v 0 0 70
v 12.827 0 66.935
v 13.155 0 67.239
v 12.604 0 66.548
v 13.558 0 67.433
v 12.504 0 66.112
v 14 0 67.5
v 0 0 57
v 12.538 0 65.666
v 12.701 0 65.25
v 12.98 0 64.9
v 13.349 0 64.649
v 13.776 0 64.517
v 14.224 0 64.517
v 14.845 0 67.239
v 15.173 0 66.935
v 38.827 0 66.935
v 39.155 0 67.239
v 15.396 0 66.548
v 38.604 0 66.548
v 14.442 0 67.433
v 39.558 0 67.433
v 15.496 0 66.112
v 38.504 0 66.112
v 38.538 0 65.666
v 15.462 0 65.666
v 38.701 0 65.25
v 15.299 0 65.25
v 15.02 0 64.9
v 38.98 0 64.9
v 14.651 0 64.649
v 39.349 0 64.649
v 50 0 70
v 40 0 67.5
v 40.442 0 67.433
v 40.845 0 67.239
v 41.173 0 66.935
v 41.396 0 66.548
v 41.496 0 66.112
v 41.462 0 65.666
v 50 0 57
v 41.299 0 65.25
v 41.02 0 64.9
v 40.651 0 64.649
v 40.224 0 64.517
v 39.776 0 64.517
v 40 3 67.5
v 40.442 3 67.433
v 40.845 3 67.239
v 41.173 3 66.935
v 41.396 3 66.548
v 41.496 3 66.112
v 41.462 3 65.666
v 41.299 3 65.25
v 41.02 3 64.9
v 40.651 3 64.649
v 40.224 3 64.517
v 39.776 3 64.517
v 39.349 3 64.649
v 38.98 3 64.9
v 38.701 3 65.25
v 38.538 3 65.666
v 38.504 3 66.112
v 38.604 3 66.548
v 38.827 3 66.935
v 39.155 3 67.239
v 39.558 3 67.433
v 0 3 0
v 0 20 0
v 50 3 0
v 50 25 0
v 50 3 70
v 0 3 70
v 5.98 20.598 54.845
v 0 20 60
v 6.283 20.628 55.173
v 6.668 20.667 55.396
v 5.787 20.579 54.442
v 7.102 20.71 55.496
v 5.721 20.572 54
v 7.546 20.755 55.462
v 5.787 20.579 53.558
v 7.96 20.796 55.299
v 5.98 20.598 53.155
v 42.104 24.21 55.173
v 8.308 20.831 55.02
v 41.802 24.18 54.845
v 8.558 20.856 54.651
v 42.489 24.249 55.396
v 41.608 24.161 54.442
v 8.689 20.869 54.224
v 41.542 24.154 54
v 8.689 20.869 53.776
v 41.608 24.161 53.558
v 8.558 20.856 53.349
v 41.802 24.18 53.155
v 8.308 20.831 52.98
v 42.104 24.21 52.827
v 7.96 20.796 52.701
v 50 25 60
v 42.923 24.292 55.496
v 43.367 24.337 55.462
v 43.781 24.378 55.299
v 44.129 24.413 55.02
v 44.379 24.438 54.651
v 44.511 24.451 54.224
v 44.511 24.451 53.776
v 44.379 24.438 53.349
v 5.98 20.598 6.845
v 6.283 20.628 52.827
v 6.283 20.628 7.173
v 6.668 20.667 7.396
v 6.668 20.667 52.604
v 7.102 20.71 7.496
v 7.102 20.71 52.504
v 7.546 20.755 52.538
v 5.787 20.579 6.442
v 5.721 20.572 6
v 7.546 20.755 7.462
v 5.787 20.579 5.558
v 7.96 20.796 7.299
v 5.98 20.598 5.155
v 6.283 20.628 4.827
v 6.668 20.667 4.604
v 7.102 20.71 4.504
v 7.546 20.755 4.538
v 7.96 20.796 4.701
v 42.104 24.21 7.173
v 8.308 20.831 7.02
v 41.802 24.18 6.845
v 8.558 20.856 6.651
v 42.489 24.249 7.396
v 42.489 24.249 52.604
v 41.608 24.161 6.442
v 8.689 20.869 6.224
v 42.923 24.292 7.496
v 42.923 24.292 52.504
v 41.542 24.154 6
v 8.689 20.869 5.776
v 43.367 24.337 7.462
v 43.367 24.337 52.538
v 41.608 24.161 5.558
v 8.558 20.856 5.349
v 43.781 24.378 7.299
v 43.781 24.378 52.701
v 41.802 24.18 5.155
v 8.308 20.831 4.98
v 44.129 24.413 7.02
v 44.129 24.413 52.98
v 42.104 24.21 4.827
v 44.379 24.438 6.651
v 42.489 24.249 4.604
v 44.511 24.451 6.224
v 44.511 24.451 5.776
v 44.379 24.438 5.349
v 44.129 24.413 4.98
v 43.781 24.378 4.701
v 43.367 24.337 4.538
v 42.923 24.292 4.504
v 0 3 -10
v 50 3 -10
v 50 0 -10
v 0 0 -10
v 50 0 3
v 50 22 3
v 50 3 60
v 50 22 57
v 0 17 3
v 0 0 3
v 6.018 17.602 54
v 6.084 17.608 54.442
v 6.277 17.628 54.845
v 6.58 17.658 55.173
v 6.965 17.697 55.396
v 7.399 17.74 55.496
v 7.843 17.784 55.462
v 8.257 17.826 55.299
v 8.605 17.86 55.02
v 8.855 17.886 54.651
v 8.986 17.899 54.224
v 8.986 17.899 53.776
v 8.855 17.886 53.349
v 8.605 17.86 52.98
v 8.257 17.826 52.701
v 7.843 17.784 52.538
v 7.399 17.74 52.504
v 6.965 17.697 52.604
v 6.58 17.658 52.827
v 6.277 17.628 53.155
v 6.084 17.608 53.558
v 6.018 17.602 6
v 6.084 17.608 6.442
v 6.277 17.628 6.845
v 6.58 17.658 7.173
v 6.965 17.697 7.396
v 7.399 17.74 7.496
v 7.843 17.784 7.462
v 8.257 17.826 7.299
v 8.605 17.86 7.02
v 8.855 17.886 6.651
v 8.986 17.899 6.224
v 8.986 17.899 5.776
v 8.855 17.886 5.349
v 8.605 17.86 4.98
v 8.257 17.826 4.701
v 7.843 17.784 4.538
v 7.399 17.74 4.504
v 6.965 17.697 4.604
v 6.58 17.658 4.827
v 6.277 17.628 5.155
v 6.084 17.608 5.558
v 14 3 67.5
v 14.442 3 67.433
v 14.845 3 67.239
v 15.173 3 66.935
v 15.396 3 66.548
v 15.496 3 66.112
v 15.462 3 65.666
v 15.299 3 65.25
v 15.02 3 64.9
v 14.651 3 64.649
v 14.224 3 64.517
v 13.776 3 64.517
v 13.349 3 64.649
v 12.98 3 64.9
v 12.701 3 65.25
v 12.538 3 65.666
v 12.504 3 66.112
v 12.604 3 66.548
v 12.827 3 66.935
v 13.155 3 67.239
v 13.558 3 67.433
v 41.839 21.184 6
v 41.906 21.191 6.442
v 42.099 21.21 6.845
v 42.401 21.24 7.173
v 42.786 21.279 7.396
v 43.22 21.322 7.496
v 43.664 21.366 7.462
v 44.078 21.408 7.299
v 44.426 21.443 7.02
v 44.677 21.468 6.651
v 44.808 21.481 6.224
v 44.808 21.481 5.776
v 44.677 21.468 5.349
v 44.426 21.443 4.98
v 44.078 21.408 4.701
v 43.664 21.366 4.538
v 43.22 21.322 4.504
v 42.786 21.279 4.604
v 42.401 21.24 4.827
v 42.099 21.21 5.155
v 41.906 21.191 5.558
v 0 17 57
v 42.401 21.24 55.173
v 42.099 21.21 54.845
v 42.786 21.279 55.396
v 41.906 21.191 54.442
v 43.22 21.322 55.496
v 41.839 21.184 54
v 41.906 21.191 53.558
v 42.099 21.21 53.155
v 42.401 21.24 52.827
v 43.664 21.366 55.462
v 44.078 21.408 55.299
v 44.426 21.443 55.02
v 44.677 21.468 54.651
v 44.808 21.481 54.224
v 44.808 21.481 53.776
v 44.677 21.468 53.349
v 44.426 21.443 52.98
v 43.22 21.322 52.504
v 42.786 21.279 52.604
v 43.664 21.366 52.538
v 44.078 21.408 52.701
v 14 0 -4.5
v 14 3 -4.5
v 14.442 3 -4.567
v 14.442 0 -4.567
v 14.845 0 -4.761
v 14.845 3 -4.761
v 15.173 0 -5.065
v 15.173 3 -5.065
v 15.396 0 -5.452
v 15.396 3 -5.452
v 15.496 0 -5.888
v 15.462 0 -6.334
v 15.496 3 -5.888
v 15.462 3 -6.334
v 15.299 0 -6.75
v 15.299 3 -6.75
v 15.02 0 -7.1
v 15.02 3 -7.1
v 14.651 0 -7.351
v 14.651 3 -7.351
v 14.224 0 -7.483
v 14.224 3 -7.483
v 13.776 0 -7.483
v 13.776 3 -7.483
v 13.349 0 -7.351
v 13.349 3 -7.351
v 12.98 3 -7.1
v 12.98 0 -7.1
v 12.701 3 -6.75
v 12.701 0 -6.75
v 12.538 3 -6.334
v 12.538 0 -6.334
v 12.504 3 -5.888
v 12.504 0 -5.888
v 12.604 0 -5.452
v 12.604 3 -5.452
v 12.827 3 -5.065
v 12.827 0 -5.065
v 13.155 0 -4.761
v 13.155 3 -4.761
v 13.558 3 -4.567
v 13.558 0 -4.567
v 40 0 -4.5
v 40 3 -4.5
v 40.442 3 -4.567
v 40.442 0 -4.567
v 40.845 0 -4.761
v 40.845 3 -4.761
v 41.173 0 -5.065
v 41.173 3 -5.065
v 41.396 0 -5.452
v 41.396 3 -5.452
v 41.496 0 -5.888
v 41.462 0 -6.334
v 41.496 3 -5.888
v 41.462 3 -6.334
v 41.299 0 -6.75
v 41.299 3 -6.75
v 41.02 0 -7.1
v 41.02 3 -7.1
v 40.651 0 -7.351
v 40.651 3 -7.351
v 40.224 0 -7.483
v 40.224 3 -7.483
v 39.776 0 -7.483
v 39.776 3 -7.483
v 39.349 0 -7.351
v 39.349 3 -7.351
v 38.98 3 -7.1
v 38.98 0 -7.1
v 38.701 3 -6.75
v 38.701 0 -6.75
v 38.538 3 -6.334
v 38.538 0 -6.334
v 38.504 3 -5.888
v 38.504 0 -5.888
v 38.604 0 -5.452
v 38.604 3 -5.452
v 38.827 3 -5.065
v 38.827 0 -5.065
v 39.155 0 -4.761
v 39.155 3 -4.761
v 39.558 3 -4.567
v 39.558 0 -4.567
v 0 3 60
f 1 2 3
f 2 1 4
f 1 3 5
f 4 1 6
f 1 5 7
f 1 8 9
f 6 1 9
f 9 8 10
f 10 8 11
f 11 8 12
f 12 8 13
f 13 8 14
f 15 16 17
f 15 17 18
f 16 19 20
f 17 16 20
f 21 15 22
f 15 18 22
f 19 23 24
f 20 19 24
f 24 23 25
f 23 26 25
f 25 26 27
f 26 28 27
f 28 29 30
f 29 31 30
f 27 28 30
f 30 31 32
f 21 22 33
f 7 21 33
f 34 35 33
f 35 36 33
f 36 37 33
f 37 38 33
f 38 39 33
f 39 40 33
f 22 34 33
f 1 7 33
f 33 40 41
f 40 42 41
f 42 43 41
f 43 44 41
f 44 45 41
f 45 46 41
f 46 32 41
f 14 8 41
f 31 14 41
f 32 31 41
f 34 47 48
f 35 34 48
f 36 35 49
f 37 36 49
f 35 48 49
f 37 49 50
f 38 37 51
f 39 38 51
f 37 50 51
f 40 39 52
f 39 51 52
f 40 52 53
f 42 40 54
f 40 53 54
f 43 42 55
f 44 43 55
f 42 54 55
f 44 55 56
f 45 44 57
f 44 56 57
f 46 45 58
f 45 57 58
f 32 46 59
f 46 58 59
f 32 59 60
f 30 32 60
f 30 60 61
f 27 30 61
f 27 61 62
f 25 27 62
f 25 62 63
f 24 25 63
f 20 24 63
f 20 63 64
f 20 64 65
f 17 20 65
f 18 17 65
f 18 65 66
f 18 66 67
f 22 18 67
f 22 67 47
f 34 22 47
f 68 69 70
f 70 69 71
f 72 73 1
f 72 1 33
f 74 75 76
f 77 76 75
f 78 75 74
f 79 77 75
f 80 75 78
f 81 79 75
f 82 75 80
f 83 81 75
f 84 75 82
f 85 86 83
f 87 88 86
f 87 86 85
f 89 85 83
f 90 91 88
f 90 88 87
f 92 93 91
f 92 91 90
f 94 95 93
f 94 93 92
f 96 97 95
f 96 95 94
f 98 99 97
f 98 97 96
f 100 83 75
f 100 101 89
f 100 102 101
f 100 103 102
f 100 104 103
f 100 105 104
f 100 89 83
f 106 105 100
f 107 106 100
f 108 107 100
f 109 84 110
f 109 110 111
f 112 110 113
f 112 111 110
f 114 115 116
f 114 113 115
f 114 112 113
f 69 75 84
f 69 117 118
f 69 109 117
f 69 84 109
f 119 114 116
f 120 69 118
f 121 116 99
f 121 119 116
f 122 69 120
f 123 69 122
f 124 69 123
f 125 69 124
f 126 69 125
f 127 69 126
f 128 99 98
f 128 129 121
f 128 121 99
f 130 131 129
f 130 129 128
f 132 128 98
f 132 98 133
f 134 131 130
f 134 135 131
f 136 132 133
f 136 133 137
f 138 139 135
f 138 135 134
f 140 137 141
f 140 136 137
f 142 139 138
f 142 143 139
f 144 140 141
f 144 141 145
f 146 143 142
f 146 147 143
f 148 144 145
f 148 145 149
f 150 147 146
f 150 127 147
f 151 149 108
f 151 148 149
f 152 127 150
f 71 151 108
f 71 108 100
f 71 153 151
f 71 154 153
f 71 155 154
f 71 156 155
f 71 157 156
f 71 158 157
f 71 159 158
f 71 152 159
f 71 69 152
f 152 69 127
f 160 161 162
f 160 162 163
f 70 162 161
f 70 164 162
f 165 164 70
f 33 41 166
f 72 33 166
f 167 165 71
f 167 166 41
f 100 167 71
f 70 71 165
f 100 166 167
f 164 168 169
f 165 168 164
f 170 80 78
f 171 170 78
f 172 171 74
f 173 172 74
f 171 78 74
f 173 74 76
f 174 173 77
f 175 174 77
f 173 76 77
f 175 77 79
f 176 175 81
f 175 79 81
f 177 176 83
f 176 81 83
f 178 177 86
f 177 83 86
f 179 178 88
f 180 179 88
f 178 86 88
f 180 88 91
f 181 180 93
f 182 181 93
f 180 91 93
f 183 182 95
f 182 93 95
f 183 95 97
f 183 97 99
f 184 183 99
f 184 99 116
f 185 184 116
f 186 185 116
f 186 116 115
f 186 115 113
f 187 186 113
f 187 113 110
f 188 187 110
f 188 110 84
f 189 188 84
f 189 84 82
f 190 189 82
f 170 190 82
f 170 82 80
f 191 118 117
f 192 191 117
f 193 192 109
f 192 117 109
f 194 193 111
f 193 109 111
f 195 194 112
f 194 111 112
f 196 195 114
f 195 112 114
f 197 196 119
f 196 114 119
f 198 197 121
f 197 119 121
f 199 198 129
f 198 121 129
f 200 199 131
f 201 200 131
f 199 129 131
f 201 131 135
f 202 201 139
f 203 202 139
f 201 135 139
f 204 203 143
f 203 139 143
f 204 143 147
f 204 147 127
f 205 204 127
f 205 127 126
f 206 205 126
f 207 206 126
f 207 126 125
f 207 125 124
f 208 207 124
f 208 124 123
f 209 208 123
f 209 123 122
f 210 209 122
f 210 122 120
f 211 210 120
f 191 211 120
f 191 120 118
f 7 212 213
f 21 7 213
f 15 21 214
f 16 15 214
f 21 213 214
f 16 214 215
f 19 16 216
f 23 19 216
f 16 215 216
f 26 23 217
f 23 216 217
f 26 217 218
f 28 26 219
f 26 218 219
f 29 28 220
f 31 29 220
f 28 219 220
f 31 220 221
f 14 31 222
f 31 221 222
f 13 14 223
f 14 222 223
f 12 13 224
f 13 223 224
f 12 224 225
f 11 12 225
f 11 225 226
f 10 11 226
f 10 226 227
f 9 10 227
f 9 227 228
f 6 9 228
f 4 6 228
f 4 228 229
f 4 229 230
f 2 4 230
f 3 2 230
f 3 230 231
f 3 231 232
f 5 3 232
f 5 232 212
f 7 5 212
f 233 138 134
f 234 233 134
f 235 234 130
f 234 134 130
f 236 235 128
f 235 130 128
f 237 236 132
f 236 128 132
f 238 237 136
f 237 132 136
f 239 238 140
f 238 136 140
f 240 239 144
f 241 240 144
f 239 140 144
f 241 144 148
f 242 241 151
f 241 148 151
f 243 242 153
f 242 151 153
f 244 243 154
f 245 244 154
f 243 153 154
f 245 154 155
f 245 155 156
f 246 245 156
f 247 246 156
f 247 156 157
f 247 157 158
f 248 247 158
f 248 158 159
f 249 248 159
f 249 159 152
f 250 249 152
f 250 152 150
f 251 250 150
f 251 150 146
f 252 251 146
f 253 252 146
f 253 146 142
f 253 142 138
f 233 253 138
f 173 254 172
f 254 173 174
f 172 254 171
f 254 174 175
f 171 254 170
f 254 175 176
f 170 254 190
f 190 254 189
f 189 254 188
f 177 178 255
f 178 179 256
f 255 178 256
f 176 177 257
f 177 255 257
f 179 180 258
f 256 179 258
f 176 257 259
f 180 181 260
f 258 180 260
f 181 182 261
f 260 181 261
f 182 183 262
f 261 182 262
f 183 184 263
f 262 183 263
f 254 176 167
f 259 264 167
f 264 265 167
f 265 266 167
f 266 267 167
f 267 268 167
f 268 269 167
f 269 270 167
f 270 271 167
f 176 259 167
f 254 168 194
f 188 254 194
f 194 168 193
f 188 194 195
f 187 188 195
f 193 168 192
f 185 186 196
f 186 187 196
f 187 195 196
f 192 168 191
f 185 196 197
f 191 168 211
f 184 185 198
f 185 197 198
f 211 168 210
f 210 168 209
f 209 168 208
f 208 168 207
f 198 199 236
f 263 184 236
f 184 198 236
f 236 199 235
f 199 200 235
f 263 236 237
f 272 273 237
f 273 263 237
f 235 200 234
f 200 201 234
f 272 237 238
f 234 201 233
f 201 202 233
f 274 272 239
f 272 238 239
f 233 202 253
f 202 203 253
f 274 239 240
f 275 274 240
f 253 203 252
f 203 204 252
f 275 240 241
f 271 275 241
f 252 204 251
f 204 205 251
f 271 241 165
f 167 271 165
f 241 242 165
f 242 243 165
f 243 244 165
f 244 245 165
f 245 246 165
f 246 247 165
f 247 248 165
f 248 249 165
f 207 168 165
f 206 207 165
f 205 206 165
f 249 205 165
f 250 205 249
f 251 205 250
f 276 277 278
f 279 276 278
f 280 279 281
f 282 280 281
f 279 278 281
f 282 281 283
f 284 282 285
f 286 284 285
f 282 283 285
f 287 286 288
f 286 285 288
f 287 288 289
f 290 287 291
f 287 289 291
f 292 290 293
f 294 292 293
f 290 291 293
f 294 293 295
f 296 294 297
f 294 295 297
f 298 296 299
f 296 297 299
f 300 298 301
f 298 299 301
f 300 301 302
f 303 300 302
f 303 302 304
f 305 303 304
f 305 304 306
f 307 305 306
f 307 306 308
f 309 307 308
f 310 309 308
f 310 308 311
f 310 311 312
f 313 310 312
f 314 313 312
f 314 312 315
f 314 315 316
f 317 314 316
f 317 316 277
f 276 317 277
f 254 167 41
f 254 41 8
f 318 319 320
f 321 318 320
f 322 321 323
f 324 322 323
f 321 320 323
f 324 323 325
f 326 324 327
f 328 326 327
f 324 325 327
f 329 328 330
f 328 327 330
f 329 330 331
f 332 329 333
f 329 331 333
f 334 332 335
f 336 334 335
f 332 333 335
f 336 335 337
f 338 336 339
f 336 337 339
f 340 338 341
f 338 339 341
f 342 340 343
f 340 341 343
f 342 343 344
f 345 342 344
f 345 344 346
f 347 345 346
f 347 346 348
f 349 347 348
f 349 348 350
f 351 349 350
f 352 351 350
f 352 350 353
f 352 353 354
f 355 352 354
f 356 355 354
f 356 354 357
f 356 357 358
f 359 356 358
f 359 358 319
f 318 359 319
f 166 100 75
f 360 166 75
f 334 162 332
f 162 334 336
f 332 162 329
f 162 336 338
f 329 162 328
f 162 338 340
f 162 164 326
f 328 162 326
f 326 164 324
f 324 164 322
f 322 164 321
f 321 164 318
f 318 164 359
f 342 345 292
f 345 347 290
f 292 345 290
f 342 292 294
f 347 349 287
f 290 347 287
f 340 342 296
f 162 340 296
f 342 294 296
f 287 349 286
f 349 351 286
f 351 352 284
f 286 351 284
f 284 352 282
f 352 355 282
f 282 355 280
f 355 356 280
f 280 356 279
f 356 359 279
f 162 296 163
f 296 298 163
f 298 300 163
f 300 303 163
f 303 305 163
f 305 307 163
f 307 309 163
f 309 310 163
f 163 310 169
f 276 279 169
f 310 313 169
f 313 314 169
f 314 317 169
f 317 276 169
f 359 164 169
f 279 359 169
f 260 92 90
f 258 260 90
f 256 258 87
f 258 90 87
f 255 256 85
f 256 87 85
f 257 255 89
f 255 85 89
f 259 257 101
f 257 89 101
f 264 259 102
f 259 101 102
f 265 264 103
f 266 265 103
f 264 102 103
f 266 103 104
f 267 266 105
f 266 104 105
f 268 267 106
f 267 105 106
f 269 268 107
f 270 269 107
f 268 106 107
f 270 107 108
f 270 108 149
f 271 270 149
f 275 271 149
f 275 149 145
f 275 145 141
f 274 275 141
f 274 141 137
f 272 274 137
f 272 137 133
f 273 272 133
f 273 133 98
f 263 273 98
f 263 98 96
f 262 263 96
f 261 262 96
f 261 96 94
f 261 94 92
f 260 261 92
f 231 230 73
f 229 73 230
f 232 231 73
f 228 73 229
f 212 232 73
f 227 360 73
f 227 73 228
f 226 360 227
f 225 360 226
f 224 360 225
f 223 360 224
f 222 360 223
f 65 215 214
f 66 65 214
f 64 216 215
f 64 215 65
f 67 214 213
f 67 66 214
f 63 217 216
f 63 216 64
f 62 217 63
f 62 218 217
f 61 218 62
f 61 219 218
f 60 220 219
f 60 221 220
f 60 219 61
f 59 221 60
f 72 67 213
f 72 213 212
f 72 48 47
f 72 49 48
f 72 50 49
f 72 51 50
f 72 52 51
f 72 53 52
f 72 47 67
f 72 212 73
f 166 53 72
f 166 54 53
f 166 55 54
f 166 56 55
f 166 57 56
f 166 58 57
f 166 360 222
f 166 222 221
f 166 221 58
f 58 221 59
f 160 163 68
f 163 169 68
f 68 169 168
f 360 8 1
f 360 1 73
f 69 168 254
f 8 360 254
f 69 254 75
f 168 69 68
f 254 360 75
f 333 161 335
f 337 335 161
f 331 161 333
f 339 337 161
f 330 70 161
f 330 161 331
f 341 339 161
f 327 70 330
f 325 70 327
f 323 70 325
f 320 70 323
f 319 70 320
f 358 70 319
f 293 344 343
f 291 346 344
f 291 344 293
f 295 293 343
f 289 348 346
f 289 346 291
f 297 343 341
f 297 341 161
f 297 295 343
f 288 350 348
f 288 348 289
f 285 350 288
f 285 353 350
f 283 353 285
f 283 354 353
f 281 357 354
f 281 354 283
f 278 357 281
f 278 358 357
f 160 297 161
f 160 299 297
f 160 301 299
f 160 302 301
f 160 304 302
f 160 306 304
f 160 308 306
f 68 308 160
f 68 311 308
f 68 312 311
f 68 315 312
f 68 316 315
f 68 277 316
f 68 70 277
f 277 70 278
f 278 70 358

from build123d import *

# Parameters (mm, degrees)
EXTRUDE_3_DEPTH     = 3
EXTRUDE_4_DEPTH     = 54
EXTRUDE_5_DEPTH     = 3
SKETCH_9_W          = 50
SKETCH_9_H          = 3
EXTRUDE_6_DEPTH     = 10
SKETCH_10_W         = 50
SKETCH_10_H         = 3
EXTRUDE_7_DEPTH     = 10
SKETCH_11_R         = 1.5
CUT_EXTRUDE_1_DEPTH = 7
SKETCH_12_R         = 1.5
CUT_EXTRUDE_2_DEPTH = 7


with BuildPart() as part:
    # 草图4 → 凸台-拉伸3 (new body)
    with BuildSketch(Plane.XY):
        Polygon((0, 0), (50, 0), (50, 25), (0, 20), align=None)
    extrude(amount=EXTRUDE_3_DEPTH)

    # 草图5 → 凸台-拉伸4 (add)
    with BuildSketch(Plane.XY.offset(3)):
        Polygon((0, 20), (0, 17), (50, 22), (50, 25), align=None)
    extrude(amount=EXTRUDE_4_DEPTH)

    # 草图8 → 凸台-拉伸5 (add)
    with BuildSketch(Plane.XY.offset(57)):
        Polygon((0, 20), (50, 25), (50, 0), (0, 0), align=None)
    extrude(amount=EXTRUDE_5_DEPTH)

    # 草图9 → 凸台-拉伸6 (add)
    with BuildSketch(Plane.XY.offset(60)):
        with Locations((25, 1.5)):
            Rectangle(SKETCH_9_W, SKETCH_9_H)
    extrude(amount=EXTRUDE_6_DEPTH)

    # 草图10 → 凸台-拉伸7 (add)
    with BuildSketch(Plane(origin=(0, 0, 0), x_dir=(-1, 0, 0), z_dir=(0, 0, -1))):
        with Locations((-25, 1.5)):
            Rectangle(SKETCH_10_W, SKETCH_10_H)
    extrude(amount=EXTRUDE_7_DEPTH)

    # 草图11 → 切除-拉伸1 (cut)
    with BuildSketch(Plane(origin=(0, 3, 0), x_dir=(1, 0, 0), z_dir=(0, 1, 0))):
        with Locations(Location((14, -66, 0), (0, 0, 270))):
            Circle(SKETCH_11_R)
        with Locations(Location((40, -66, 0), (0, 0, 270))):
            Circle(SKETCH_11_R)
        with Locations(Location((40, 6, 0), (0, 0, 270))):
            Circle(SKETCH_11_R)
        with Locations(Location((14, 6, 0), (0, 0, 270))):
            Circle(SKETCH_11_R)
    extrude(amount=-CUT_EXTRUDE_1_DEPTH, mode=Mode.SUBTRACT)

    # 草图12 → 切除-拉伸2 (cut)
    with BuildSketch(Plane(origin=(-1.98019802, 19.801980198, 0), x_dir=(0.9950371902099892, 0.09950371902099896, 0), z_dir=(-0.09950371902099897, 0.9950371902099893, 0))):
        with Locations(Location((45.239452486, -6, 0), (0, 0, 180))):
            Circle(SKETCH_12_R)
        with Locations(Location((45.239452486, -54, 0), (0, 0, 180))):
            Circle(SKETCH_12_R)
        with Locations(Location((9.239452486, -54, 0), (0, 0, 180))):
            Circle(SKETCH_12_R)
        with Locations(Location((9.239452486, -6, 0), (0, 0, 180))):
            Circle(SKETCH_12_R)
    extrude(amount=-CUT_EXTRUDE_2_DEPTH, mode=Mode.SUBTRACT)


solid = part.part
